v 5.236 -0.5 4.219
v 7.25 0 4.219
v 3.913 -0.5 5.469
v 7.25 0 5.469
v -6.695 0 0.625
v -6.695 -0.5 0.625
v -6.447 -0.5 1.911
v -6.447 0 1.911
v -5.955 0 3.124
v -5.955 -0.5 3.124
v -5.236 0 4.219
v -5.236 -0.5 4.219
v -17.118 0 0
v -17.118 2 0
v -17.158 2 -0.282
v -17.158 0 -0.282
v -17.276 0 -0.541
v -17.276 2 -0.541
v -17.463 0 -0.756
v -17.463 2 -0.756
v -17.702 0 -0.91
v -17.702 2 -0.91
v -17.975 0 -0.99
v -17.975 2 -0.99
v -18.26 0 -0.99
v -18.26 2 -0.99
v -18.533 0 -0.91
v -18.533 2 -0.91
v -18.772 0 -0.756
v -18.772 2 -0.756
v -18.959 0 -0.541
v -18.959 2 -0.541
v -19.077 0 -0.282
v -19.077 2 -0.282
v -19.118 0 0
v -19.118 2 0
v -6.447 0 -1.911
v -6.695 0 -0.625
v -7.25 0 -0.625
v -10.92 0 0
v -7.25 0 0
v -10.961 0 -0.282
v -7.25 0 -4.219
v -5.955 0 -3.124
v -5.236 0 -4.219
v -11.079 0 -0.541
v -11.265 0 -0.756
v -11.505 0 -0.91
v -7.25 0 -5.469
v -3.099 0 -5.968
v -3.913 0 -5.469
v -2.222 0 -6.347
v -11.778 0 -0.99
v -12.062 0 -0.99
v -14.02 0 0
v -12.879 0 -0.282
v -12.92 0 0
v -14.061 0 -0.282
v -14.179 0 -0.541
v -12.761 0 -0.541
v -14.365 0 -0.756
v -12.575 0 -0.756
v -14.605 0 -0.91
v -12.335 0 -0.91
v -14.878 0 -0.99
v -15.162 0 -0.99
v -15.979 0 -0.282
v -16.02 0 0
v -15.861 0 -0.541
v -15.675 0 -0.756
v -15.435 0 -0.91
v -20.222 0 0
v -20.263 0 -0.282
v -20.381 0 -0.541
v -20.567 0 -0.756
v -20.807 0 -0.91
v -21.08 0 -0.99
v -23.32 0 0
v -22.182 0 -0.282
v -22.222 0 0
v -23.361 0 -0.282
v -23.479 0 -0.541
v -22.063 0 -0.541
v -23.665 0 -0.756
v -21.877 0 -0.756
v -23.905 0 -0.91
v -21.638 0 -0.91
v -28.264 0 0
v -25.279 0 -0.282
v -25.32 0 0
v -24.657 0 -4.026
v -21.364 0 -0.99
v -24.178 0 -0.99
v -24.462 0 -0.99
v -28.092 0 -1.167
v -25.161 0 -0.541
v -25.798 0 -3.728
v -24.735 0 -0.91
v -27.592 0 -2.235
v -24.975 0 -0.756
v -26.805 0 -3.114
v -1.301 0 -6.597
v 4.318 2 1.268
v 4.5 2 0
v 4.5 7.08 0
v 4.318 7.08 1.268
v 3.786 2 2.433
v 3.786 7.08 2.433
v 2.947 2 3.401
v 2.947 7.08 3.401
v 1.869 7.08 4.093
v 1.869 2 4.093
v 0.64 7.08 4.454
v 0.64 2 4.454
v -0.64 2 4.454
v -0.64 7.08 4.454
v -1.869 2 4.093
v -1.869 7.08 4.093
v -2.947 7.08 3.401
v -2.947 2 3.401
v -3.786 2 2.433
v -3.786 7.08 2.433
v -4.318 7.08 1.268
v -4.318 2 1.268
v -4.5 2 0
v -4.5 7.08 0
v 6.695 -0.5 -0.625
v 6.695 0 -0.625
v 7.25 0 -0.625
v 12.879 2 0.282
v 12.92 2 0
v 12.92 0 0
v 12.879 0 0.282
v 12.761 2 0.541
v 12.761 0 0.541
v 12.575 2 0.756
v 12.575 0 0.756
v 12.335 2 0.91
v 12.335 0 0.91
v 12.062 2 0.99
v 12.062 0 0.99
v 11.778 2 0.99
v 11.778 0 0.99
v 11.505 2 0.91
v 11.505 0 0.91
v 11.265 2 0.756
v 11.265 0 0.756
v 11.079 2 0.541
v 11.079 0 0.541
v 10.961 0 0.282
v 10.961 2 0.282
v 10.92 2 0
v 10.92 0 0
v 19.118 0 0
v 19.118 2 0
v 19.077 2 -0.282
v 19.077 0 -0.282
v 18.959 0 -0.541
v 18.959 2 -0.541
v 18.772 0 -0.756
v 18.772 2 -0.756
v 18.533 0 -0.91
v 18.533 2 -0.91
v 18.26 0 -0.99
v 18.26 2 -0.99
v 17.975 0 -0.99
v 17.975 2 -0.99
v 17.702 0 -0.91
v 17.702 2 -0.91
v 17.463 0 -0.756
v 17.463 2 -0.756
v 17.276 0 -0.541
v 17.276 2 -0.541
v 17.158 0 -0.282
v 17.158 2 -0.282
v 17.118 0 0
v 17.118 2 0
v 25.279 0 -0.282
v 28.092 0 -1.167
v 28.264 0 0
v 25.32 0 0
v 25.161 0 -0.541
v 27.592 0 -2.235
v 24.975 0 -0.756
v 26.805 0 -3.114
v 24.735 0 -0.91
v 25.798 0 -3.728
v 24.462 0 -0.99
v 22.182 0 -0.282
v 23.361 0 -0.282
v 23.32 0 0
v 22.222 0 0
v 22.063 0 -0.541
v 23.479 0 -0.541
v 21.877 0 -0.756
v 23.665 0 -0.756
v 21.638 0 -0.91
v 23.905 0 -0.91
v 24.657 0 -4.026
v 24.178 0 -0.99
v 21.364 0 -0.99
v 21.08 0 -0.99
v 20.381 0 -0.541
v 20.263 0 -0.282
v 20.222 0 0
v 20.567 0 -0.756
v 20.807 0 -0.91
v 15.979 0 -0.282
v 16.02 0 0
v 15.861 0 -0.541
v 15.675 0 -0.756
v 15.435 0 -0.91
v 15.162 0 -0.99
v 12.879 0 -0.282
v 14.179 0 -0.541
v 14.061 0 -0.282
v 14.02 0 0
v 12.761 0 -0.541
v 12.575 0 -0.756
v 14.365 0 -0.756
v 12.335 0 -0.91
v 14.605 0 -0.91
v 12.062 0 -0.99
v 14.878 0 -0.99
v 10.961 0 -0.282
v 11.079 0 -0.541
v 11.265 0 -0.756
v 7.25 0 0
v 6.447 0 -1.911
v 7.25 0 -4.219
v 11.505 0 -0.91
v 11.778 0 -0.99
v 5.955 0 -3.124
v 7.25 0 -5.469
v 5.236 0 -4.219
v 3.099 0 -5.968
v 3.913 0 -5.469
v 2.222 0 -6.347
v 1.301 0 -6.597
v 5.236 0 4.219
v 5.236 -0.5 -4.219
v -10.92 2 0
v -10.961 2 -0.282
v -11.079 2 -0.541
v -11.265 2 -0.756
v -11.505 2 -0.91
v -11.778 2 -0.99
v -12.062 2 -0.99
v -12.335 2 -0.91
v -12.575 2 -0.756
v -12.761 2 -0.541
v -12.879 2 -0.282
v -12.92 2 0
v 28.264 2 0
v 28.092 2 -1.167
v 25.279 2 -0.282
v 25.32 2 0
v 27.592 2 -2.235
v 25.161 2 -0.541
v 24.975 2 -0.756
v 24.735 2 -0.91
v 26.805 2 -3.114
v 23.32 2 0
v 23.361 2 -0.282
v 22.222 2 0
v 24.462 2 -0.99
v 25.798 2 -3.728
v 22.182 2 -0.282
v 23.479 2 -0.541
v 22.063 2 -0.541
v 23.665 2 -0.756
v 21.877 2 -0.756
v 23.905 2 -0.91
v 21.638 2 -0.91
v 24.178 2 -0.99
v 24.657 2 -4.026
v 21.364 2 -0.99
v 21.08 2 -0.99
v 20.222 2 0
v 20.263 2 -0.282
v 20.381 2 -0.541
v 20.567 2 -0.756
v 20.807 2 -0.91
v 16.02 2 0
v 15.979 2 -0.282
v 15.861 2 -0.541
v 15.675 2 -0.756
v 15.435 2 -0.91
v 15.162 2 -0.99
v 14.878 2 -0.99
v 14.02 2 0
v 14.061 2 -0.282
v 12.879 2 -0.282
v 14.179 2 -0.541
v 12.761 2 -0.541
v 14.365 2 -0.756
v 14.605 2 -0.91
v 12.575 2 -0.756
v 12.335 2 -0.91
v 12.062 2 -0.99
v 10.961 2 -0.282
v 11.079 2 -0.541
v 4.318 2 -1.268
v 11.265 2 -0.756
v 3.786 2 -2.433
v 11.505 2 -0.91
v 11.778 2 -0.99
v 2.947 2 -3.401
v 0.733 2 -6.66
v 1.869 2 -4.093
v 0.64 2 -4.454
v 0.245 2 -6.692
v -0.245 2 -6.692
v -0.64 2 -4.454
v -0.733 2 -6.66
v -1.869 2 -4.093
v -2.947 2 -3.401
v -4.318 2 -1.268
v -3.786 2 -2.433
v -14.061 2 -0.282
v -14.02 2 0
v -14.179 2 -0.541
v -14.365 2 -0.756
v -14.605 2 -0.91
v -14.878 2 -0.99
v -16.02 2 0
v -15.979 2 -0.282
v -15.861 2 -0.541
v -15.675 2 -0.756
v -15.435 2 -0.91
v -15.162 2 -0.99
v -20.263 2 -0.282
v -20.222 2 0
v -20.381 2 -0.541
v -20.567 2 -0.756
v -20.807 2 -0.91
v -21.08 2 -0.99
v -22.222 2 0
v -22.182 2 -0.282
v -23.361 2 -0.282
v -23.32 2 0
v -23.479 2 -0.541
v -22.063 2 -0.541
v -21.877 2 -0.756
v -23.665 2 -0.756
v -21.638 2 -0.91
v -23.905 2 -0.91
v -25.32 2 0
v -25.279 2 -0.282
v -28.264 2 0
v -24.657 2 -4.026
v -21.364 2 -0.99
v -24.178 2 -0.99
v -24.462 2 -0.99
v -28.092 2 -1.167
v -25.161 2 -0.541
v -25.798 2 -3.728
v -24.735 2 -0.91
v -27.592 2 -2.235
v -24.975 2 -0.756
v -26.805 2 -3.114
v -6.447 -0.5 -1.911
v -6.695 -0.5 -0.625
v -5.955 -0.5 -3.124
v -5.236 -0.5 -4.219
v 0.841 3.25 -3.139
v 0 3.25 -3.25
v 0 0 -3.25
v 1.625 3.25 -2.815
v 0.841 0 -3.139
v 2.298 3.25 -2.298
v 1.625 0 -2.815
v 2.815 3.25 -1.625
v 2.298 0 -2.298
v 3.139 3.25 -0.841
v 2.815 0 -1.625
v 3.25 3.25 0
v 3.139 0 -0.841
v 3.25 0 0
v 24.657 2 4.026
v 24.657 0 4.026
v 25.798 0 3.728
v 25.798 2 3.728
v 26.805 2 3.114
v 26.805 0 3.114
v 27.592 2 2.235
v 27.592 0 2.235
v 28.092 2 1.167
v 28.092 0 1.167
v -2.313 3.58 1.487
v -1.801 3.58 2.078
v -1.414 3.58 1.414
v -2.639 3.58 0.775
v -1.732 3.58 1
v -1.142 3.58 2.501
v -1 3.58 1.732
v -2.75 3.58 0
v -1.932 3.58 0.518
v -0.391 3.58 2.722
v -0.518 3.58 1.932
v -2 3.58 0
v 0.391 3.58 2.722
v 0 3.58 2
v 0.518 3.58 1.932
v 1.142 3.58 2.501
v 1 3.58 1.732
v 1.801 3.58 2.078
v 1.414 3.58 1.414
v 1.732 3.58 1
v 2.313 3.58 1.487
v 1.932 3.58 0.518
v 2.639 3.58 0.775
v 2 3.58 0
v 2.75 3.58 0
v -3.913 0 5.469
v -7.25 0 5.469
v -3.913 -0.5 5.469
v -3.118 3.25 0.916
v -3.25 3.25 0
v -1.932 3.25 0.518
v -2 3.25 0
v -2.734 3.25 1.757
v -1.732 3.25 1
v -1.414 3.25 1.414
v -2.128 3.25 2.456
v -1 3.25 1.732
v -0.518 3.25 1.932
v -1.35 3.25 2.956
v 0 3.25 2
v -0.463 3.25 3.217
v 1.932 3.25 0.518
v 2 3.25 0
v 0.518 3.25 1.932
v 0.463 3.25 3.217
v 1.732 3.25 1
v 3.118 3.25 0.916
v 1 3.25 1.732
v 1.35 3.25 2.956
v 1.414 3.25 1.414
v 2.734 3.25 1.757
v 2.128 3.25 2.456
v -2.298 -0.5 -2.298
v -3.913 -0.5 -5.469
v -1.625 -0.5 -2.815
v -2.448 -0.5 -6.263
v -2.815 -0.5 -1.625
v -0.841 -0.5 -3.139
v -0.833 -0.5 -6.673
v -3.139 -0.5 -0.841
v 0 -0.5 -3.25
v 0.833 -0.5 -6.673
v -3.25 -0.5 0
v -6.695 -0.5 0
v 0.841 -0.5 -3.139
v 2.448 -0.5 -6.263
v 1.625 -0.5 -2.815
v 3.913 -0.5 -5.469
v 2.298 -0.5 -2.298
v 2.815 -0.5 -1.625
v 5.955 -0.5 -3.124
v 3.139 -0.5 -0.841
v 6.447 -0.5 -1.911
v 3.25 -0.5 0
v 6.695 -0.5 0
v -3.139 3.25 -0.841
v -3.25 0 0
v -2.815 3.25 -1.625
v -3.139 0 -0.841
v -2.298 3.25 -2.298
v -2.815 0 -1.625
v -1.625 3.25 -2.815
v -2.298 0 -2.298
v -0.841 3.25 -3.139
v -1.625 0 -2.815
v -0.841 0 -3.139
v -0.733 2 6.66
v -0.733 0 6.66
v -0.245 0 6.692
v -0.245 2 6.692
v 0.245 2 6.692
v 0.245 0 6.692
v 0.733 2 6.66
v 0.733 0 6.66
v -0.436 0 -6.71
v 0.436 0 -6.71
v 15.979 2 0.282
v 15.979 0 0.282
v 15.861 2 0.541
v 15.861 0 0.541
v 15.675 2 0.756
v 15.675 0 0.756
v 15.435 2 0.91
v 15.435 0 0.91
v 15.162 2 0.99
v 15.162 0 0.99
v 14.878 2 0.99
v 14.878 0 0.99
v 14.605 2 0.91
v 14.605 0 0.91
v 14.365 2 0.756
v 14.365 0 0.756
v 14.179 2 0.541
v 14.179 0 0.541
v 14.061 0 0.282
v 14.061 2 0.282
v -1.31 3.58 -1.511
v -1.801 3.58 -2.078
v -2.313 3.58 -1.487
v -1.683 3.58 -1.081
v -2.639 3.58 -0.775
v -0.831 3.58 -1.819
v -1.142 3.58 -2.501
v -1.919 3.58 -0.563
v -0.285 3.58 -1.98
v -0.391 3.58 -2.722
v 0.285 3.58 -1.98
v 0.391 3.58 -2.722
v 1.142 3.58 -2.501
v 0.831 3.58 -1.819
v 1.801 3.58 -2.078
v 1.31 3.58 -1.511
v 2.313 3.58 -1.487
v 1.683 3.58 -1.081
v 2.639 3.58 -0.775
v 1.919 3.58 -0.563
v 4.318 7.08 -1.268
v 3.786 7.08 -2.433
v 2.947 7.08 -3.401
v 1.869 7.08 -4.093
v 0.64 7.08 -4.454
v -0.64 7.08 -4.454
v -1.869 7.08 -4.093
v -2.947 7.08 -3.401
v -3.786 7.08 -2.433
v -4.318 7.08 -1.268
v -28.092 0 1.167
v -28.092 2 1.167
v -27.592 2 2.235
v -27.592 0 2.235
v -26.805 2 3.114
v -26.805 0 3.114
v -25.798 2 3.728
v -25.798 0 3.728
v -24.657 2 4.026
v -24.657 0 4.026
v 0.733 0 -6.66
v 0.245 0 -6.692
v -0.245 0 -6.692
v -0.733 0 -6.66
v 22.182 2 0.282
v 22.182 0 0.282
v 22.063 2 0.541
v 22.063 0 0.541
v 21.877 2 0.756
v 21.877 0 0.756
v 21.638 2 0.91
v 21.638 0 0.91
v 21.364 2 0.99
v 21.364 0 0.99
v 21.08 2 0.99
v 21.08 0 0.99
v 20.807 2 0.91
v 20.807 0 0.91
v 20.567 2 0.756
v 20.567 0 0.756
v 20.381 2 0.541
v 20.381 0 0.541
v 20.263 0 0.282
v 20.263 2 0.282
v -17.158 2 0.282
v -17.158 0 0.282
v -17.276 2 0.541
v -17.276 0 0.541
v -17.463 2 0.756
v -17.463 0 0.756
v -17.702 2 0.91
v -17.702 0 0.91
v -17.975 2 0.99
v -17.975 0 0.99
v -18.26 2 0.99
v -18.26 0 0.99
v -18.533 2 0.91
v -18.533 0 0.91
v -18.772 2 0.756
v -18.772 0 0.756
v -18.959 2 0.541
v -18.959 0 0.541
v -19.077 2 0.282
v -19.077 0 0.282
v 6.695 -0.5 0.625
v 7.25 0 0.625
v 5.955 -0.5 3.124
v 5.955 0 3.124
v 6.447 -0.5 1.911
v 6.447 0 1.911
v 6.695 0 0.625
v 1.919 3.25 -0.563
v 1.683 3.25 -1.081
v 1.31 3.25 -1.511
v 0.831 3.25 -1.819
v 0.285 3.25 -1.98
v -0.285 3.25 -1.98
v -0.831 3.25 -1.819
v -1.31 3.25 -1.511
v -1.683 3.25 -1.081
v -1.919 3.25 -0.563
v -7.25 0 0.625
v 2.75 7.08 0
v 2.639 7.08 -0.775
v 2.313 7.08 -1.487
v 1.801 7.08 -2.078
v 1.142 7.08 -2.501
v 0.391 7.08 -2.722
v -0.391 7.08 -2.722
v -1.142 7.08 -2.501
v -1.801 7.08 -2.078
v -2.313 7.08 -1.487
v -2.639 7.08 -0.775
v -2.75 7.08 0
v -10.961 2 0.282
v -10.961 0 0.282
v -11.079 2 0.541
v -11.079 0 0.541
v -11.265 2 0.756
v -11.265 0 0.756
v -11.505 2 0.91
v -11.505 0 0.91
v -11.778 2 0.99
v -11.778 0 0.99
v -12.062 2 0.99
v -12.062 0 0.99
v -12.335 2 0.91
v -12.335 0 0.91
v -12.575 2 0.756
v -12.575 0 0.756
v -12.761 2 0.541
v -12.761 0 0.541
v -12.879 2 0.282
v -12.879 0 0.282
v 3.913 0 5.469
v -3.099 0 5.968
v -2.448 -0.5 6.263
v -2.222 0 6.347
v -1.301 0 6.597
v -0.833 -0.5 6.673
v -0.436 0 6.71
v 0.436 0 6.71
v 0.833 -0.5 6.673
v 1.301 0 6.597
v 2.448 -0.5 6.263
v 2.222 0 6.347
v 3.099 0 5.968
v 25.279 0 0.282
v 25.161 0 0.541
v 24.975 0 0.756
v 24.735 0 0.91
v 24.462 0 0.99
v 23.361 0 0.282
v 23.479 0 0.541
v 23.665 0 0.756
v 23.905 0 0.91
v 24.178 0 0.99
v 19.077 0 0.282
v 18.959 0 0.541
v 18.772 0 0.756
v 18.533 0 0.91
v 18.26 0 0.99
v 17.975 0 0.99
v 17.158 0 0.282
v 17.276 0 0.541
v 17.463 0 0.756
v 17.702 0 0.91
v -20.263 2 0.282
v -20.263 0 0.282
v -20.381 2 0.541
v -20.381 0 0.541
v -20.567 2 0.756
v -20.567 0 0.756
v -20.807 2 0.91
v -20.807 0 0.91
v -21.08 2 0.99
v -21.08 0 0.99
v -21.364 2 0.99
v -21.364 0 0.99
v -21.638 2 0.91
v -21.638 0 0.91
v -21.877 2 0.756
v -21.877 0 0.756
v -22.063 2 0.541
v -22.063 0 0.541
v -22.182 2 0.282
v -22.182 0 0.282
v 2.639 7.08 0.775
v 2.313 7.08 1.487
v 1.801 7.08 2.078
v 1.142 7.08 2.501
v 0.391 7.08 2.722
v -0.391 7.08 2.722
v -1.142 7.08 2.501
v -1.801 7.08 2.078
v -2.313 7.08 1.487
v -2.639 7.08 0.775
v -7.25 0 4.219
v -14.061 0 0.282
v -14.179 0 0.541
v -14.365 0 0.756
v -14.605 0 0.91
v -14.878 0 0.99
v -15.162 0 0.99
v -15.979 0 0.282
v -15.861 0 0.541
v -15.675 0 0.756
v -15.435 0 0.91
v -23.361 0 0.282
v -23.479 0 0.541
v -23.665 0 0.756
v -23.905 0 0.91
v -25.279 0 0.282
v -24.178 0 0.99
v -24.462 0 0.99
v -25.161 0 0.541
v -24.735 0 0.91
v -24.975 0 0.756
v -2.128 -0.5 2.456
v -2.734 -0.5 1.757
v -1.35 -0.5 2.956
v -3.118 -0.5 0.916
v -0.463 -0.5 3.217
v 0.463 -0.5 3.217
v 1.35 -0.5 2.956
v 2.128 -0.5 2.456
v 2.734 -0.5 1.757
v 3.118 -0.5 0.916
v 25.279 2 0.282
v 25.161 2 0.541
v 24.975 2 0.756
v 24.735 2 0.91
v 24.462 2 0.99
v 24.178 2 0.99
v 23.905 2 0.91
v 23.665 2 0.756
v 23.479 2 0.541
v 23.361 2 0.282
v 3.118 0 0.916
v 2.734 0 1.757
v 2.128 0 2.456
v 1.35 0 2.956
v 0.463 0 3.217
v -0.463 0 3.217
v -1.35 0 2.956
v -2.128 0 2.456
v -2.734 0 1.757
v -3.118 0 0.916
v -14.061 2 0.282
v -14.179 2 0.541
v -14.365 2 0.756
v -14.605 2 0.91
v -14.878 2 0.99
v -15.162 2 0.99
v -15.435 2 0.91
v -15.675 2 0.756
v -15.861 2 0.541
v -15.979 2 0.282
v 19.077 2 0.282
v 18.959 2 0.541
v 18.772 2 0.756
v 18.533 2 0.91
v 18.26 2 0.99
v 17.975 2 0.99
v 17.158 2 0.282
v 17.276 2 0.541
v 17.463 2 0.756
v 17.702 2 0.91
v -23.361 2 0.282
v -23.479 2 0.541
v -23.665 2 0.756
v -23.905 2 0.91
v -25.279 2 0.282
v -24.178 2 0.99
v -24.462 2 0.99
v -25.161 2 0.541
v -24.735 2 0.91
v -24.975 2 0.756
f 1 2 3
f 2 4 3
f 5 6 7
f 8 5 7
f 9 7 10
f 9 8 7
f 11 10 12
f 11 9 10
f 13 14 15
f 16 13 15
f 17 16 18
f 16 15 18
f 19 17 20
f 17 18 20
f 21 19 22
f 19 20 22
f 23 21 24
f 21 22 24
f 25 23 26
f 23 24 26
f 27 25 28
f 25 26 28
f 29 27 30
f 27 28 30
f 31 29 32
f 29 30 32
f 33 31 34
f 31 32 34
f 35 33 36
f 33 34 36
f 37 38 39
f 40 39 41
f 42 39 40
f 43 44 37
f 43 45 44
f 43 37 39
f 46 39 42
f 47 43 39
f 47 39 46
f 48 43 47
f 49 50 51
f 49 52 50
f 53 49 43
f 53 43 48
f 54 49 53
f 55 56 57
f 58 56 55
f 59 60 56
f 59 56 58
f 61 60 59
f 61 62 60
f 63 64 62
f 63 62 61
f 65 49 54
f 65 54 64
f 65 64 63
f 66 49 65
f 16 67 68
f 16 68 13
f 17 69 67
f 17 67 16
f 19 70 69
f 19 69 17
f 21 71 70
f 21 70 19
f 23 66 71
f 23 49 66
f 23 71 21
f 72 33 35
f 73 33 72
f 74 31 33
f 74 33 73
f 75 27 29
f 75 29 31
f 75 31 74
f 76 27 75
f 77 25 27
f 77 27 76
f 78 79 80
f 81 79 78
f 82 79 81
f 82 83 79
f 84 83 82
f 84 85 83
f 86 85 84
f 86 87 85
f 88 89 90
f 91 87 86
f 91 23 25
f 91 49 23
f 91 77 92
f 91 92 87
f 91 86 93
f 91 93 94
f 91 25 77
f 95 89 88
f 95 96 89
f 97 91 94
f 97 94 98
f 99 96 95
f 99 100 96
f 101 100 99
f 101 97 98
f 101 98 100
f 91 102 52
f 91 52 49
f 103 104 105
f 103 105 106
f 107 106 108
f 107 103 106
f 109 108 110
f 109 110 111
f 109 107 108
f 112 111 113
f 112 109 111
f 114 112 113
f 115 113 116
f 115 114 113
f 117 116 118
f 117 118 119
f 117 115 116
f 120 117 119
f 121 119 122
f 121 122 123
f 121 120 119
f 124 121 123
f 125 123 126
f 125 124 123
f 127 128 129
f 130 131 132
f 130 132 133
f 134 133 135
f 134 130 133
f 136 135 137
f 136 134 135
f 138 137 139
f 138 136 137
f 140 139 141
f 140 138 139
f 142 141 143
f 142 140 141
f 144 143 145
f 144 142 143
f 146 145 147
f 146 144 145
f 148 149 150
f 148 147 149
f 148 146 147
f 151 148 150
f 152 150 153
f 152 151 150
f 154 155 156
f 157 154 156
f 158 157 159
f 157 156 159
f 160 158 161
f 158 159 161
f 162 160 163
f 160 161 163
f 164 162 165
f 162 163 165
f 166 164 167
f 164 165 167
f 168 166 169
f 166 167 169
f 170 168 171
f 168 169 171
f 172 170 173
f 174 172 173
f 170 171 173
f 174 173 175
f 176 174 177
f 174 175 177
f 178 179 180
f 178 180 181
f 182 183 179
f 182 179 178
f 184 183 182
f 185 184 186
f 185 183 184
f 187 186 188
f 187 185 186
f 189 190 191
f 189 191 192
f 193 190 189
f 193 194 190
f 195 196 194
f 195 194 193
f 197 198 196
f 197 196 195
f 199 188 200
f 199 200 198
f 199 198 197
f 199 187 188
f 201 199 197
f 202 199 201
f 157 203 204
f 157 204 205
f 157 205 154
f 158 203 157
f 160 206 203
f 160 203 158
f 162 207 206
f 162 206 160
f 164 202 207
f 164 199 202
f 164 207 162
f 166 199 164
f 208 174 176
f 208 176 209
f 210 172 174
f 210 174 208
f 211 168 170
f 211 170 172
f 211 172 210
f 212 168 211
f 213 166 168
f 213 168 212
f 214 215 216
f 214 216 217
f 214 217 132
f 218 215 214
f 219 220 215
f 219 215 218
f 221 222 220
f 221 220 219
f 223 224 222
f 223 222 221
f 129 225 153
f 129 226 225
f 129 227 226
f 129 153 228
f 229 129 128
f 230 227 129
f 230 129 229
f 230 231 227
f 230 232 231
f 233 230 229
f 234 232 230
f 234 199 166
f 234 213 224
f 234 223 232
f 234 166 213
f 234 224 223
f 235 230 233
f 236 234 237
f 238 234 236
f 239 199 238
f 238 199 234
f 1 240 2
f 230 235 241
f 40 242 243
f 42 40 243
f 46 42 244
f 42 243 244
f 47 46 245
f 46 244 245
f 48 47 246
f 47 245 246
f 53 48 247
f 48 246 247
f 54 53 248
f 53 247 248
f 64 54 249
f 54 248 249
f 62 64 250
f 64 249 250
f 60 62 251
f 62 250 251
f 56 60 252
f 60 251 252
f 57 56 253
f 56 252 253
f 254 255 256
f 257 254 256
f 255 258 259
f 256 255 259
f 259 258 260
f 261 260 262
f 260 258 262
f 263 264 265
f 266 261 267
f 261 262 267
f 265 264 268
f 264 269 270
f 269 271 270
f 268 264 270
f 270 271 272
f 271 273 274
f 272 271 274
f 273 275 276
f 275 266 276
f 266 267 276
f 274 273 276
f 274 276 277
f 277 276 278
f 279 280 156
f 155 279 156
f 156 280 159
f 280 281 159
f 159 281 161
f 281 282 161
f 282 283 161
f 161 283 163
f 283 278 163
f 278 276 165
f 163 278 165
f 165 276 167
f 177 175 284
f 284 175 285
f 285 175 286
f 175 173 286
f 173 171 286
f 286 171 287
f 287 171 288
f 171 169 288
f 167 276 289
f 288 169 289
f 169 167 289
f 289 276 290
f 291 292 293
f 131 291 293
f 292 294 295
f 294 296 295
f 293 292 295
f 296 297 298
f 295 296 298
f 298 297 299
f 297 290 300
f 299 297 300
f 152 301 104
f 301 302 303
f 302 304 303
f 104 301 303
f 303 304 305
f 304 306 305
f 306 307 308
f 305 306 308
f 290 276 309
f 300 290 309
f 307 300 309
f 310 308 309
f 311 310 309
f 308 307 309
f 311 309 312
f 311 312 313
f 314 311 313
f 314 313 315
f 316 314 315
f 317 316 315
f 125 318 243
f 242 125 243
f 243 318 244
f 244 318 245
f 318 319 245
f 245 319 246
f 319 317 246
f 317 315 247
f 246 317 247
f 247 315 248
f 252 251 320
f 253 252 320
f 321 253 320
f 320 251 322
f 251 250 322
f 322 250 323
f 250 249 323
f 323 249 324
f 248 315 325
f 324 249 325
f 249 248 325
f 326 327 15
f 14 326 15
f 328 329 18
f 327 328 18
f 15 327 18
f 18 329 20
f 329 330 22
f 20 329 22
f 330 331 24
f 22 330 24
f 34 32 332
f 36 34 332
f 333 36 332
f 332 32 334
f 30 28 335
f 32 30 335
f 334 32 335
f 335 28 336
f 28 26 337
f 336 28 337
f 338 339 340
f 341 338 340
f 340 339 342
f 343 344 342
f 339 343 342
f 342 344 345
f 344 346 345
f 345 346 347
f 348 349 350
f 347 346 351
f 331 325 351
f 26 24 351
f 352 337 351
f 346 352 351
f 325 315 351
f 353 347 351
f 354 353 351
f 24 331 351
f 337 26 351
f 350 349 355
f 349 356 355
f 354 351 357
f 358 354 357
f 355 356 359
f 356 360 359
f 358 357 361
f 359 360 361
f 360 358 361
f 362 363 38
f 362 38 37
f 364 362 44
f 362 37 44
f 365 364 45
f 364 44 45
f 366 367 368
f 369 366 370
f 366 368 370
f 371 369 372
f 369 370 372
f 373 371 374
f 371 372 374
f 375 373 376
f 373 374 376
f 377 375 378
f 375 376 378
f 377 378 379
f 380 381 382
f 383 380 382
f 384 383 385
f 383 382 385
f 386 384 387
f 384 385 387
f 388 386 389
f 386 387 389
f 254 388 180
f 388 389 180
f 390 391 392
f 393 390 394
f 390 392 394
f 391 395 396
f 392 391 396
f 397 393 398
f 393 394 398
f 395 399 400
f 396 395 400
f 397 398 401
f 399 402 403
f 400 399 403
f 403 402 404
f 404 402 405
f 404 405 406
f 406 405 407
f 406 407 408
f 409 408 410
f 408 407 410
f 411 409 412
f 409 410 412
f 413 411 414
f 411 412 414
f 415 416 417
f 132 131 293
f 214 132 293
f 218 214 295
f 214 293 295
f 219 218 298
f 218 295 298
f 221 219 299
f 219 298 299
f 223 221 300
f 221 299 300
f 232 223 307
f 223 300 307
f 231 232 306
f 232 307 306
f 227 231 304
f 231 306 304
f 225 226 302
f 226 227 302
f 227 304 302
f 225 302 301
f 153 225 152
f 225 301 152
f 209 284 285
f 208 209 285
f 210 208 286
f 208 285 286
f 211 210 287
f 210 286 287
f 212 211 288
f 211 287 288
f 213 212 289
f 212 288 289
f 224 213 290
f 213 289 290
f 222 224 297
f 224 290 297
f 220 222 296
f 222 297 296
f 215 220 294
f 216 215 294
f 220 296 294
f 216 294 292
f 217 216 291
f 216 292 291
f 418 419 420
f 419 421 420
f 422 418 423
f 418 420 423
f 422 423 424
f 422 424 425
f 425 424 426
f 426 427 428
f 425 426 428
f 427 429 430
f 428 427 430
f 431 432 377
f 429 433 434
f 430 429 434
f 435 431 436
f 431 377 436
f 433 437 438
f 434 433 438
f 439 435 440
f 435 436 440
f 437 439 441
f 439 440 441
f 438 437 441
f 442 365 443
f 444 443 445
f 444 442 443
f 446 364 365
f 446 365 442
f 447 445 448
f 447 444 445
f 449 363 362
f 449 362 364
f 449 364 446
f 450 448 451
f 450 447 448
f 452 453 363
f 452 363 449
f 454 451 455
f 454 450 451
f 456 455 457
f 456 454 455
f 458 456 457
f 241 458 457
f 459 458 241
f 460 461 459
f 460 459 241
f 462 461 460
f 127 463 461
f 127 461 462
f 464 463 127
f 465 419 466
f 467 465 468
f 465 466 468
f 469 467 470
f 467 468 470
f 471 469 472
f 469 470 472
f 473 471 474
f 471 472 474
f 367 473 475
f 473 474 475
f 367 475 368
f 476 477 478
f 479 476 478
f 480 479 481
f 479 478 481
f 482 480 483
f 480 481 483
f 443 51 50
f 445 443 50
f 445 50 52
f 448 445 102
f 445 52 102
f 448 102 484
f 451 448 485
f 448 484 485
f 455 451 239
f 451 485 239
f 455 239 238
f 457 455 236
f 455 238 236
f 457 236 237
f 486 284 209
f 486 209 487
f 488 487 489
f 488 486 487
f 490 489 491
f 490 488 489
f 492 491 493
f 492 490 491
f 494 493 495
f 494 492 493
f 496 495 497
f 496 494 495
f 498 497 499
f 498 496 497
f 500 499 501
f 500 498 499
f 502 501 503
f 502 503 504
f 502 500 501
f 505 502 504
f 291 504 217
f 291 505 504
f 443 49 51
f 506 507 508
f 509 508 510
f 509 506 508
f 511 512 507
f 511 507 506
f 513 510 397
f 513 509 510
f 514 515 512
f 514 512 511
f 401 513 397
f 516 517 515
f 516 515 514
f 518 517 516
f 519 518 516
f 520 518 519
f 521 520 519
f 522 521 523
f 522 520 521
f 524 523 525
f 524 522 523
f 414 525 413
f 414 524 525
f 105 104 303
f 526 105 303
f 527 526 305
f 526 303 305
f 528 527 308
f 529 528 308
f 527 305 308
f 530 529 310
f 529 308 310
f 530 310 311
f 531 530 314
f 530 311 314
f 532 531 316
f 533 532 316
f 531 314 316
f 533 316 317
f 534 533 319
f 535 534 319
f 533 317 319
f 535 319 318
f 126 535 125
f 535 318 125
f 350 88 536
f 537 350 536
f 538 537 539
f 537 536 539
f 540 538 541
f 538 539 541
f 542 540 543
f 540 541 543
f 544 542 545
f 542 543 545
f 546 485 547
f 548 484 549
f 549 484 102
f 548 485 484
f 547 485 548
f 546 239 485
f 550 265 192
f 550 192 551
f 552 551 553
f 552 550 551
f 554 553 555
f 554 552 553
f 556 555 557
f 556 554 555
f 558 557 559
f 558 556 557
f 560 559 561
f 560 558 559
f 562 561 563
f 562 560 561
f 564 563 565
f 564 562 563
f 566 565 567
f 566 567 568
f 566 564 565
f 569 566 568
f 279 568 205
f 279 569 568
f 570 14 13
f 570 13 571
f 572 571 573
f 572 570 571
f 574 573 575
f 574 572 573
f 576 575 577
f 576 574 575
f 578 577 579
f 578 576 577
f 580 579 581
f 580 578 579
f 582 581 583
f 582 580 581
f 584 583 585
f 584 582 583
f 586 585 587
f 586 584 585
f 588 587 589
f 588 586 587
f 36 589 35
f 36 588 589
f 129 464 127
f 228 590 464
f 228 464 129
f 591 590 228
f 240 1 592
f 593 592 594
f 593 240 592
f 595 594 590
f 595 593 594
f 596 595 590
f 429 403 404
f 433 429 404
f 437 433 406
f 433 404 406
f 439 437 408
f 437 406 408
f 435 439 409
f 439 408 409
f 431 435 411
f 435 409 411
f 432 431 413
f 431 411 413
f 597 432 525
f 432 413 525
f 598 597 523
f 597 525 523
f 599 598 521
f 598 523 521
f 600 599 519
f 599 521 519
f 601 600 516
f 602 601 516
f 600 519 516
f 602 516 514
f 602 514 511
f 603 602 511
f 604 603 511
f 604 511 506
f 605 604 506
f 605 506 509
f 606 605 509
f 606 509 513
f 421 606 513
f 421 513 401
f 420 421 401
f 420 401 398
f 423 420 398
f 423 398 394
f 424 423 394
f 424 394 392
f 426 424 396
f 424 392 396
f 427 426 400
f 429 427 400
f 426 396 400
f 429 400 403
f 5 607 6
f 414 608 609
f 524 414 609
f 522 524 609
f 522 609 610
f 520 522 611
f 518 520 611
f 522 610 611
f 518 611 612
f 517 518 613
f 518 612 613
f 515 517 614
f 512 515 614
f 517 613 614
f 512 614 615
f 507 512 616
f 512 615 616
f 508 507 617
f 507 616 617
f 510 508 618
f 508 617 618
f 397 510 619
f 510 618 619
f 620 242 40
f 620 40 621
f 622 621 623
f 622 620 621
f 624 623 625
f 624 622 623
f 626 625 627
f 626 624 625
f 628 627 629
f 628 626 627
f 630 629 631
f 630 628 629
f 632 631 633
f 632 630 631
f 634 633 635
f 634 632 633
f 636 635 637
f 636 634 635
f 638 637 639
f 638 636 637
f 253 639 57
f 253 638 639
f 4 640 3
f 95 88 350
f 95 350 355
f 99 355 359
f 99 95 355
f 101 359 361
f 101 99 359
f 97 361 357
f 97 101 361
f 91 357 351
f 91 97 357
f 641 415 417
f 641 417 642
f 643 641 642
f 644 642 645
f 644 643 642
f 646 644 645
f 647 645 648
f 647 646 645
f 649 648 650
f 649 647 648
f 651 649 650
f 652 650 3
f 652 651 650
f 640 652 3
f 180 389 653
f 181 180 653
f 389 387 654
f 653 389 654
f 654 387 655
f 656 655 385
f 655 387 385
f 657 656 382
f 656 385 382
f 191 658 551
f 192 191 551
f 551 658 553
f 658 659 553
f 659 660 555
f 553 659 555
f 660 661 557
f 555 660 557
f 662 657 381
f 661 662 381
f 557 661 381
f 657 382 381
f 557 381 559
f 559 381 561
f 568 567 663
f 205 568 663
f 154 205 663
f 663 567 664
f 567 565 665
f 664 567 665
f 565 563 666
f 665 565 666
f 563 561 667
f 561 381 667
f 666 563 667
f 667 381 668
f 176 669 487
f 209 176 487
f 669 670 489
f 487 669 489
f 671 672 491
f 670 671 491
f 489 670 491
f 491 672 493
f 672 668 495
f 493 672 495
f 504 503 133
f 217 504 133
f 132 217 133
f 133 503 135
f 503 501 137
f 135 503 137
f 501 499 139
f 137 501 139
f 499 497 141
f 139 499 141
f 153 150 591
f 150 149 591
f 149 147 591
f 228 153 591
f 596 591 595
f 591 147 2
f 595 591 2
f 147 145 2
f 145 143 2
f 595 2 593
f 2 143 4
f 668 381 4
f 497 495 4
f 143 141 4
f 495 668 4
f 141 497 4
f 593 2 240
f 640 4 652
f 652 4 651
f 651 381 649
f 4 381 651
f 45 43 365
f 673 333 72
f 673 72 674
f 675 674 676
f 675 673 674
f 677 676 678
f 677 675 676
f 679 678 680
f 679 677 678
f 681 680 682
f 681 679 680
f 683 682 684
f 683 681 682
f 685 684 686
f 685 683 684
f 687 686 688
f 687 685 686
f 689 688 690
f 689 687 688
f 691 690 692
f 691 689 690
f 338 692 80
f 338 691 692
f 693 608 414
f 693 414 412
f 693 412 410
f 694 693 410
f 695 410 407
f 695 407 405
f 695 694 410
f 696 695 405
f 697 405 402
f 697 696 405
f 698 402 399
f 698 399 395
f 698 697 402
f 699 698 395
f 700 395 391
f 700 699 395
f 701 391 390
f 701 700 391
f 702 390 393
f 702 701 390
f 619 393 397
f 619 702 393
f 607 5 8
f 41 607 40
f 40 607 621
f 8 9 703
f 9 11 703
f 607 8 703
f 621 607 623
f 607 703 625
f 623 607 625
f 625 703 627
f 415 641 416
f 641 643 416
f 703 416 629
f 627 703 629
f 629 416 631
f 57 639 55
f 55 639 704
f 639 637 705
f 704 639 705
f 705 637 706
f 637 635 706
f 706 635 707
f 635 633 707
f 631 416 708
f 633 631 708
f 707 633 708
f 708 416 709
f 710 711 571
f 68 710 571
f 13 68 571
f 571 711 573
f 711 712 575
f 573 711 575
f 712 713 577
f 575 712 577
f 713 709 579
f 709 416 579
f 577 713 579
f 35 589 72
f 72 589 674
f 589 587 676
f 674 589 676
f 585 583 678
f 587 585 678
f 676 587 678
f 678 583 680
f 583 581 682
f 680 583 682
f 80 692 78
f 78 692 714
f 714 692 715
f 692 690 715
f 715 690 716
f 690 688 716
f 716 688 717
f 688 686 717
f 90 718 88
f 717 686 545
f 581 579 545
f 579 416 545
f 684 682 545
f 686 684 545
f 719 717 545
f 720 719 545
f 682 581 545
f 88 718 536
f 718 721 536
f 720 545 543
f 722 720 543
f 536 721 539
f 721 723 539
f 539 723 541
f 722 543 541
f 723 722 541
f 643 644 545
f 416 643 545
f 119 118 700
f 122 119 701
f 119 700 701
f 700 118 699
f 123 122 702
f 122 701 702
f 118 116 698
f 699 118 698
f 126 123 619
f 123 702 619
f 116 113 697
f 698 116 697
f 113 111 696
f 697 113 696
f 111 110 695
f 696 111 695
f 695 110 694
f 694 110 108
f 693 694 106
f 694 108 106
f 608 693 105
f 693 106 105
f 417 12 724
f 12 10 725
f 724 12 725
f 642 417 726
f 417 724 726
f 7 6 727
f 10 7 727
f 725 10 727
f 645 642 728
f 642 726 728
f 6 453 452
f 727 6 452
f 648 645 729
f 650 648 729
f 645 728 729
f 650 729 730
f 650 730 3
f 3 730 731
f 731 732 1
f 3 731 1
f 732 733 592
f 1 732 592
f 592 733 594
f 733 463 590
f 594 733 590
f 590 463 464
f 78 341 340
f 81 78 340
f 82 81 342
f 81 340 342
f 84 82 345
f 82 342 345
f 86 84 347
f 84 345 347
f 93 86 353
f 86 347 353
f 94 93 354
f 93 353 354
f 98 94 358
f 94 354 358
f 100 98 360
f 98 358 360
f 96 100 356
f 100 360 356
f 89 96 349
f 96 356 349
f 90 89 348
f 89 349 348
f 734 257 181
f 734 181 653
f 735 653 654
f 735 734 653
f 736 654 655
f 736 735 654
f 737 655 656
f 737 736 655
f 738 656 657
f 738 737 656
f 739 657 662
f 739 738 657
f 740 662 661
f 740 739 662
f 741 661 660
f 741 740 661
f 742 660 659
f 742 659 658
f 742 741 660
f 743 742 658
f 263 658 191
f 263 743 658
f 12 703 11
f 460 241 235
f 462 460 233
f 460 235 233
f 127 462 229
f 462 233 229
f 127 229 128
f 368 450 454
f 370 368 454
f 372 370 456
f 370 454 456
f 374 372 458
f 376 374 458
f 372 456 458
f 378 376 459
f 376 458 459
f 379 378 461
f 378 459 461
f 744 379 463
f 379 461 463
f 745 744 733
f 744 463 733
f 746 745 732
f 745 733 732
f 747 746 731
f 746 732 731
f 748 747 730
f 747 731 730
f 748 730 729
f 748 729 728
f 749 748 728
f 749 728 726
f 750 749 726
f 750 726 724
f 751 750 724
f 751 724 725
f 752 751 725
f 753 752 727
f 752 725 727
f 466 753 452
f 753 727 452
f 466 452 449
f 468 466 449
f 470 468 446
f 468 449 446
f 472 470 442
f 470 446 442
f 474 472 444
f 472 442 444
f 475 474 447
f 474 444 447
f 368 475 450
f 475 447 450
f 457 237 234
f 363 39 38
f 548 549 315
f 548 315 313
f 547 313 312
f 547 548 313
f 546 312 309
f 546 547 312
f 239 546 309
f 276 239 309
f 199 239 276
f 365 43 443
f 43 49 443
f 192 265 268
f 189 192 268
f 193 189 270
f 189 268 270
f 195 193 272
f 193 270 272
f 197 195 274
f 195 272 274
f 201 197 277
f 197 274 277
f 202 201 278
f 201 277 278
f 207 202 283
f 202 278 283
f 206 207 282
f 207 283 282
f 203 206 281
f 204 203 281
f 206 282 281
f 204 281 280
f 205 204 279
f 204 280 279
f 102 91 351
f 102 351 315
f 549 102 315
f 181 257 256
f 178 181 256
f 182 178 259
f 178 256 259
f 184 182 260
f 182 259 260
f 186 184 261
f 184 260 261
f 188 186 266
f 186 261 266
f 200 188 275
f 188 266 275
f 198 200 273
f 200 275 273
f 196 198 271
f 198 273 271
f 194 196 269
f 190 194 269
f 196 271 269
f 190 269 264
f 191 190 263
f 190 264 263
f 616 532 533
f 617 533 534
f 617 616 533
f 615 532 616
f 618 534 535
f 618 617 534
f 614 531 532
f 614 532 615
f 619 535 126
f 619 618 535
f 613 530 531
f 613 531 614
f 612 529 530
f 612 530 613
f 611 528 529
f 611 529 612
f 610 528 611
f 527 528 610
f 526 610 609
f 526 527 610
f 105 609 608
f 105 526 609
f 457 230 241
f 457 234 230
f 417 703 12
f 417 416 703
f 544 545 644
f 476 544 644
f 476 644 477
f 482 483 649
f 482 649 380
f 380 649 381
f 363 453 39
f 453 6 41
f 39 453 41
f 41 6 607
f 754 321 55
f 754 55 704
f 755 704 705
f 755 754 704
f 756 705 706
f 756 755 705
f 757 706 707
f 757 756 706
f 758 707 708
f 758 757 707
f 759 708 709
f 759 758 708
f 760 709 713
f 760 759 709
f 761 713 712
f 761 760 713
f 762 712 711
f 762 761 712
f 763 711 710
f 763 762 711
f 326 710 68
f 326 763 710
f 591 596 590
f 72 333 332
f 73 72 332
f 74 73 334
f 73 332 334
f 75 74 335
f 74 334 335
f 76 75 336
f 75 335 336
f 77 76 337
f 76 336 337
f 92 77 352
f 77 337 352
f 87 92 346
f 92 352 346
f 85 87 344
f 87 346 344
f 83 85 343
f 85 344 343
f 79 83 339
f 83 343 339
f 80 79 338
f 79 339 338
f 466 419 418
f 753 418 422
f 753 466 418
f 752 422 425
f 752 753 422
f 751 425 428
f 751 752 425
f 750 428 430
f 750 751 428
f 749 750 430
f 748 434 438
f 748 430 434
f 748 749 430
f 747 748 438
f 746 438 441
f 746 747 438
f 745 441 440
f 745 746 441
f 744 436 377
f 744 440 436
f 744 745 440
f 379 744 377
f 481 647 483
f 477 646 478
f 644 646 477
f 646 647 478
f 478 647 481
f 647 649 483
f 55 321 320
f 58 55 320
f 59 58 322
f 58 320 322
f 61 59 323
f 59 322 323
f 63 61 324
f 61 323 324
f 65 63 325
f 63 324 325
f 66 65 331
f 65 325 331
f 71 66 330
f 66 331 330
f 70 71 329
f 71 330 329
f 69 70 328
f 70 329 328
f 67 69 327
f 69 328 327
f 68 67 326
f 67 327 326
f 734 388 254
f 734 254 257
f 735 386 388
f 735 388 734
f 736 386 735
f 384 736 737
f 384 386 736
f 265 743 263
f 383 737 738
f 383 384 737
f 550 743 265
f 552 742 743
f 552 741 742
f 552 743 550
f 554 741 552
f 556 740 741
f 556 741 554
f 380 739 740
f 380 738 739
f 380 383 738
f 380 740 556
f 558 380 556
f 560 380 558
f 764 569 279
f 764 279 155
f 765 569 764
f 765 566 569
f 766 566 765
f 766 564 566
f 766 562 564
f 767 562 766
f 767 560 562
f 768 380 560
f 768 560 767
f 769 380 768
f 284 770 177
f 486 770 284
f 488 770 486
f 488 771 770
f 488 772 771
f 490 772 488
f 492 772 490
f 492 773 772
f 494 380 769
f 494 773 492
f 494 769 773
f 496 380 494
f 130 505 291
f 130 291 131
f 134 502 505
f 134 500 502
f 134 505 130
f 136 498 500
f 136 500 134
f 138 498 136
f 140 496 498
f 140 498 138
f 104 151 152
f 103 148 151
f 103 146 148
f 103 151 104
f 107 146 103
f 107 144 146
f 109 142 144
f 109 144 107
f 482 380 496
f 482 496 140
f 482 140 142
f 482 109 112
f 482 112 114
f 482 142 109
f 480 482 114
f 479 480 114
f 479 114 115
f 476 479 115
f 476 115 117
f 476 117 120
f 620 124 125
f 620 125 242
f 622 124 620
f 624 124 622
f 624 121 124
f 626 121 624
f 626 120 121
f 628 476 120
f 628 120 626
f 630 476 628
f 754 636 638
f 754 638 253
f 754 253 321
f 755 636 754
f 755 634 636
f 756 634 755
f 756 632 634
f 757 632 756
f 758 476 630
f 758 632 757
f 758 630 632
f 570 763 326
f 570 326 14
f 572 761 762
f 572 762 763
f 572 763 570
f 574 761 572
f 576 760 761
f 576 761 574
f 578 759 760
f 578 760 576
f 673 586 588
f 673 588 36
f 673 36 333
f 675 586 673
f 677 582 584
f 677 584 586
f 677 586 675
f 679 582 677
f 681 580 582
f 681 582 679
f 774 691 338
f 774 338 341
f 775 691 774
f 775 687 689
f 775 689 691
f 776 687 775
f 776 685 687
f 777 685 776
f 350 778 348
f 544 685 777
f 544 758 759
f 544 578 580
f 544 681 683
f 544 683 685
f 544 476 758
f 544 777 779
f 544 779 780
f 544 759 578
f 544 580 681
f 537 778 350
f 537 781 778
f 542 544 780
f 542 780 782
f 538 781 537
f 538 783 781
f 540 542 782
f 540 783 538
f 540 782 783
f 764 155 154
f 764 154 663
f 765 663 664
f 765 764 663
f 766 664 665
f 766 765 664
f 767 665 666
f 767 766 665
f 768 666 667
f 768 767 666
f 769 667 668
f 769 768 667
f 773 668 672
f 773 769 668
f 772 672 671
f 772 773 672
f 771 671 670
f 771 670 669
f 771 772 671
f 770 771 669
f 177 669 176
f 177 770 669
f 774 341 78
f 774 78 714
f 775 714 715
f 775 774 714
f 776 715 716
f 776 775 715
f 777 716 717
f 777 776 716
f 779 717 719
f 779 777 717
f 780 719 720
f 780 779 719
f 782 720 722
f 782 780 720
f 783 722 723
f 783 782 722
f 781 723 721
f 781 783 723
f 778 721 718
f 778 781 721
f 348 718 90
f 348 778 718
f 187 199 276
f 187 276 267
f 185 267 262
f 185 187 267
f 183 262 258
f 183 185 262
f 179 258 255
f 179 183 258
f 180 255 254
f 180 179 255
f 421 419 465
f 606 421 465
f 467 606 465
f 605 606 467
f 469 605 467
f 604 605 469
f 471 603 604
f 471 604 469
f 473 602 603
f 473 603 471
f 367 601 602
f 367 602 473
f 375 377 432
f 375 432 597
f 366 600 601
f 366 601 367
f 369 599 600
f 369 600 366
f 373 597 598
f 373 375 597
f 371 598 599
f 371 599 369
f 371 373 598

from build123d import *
from build123d.topology import SkipClean

# Parameters (mm, degrees)
BOSS_EXTRUDE1_DEPTH = 2
SKETCH2_R           = 1.000000794
CUT_EXTRUDE1_DEPTH  = 2
SKETCH3_R           = 4.5
BOSS_EXTRUDE2_DEPTH = 5.08
SKETCH4_R           = 2.75
CUT_EXTRUDE2_DEPTH  = 3.5
SKETCH5_R           = 3.25
CUT_EXTRUDE3_DEPTH  = 3.25
SKETCH7_R           = 6.724332425
BOSS_EXTRUDE3_DEPTH = 0.5
SKETCH8_W           = 14.5
SKETCH8_H           = 1.25
SKETCH8_H_2         = 1.25000004
BOSS_EXTRUDE4_DEPTH = 0.5
SKETCH6_R           = 2
CUT_EXTRUDE4_DEPTH  = 30.338041851
SKETCH15_R          = 3.25
CUT_EXTRUDE5_DEPTH  = 3.75


# Read off the part's stored shape, not the designer's step: Mirror3
with BuildPart() as part:
    # Sketch1 → Boss-Extrude1 (new body)
    with BuildSketch(Plane(origin=(0, 0, 0), x_dir=(1, 0, 0), z_dir=(0, 1, 0))):
        with BuildLine():
            Line((-24.656541995, 4.026414392), (-0.733072501, 6.659779954))
            ThreePointArc((-0.733072501, 6.659779954), (0, 6.695526614), (0.733072501, 6.659779954))
            Line((0.733072501, 6.659779954), (24.656541995, 4.026414392))
            ThreePointArc((24.656541995, 4.026414392), (28.264069964, 0), (24.656541995, -4.026414392))
            Line((24.656541995, -4.026414392), (0.733072501, -6.659779954))
            ThreePointArc((0.733072501, -6.659779954), (0, -6.695526614), (-0.733072501, -6.659779954))
            Line((-0.733072501, -6.659779954), (-24.656541995, -4.026414392))
            ThreePointArc((-24.656541995, -4.026414392), (-28.264069964, 0), (-24.656541995, 4.026414392))
        make_face()
    extrude(amount=BOSS_EXTRUDE1_DEPTH)

    # Sketch2 → Cut-Extrude1 (cut)
    with BuildSketch(Plane(origin=(0, 2, 0), x_dir=(1, 0, 0), z_dir=(0, 1, 0))):
        with Locations(Location((-24.320001144, 0, 0), (0, 0, 270))):
            Circle(SKETCH2_R)
        with Locations(Location((-21.222128244, 0, 0), (0, 0, 270))):
            Circle(SKETCH2_R)
        with Locations(Location((-18.117543648, 0, 0), (0, 0, 270))):
            Circle(SKETCH2_R)
        with Locations(Location((-15.019999932, 0, 0), (0, 0, 270))):
            Circle(SKETCH2_R)
        with Locations(Location((-11.919999782, 0, 0), (0, 0, 270))):
            Circle(SKETCH2_R)
        with Locations(Location((24.320001144, 0, 0), (0, 0, 90))):
            Circle(SKETCH2_R)
        with Locations(Location((21.222128244, 0, 0), (0, 0, 90))):
            Circle(SKETCH2_R)
        with Locations(Location((18.117543648, 0, 0), (0, 0, 90))):
            Circle(SKETCH2_R)
        with Locations(Location((15.019999932, 0, 0), (0, 0, 90))):
            Circle(SKETCH2_R)
        with Locations(Location((11.919999782, 0, 0), (0, 0, 90))):
            Circle(SKETCH2_R)
    extrude(amount=-CUT_EXTRUDE1_DEPTH, mode=Mode.SUBTRACT)

    # Sketch3 → Boss-Extrude2 (add)
    with BuildSketch(Plane(origin=(0, 2, 0), x_dir=(1, 0, 0), z_dir=(0, 1, 0))):
        with Locations(Location((0, 0, 0), (0, 0, 270))):
            Circle(SKETCH3_R)
    extrude(amount=BOSS_EXTRUDE2_DEPTH)

    # Sketch4 → Cut-Extrude2 (cut)
    with BuildSketch(Plane(origin=(0, 7.08, 0), x_dir=(1, 0, 0), z_dir=(0, 1, 0))):
        with Locations(Location((0, 0, 0), (0, 0, 270))):
            Circle(SKETCH4_R)
    extrude(amount=-CUT_EXTRUDE2_DEPTH, mode=Mode.SUBTRACT)

    # Sketch5 → Cut-Extrude3 (cut)
    with BuildSketch(Plane.XZ):
        with Locations(Location((0, 0, 0), (0, 0, 270))):
            Circle(SKETCH5_R)
    extrude(amount=-CUT_EXTRUDE3_DEPTH, mode=Mode.SUBTRACT)

    # Sketch7 → Boss-Extrude3 (add)
    with BuildSketch(Plane.XZ):
        with Locations(Location((0, 0, 0), (0, 0, 78.843263662))):
            Circle(SKETCH7_R)
    extrude(amount=BOSS_EXTRUDE3_DEPTH)

    # Sketch8 → Boss-Extrude4 (add)
    with BuildSketch(Plane.XZ):
        Rectangle(SKETCH8_W, SKETCH8_H)
        with Locations((0, -4.843845819)):
            Rectangle(SKETCH8_W, SKETCH8_H_2)
        with Locations((0, 4.843845819)):
            Rectangle(SKETCH8_W, SKETCH8_H_2)
    extrude(amount=BOSS_EXTRUDE4_DEPTH)

    # Sketch13 → Cut-Loft1 section 0
    with BuildSketch(Plane.XY.offset(-4.218845799)):
        with BuildLine():
            Line((-7.25, 0), (-5.236218739, -0.5))
            Line((-5.236218739, -0.5), (-7.25, -0.5))
            Line((-7.25, -0.5), (-7.25, 0))
        make_face()
    # Sketch12 → Cut-Loft1 section 1
    with BuildSketch(Plane(origin=(0, 0, -5.468845839), x_dir=(-1, 0, 0), z_dir=(0, 0, -1))):
        with BuildLine():
            Line((3.912591436, -0.5), (7.25, -0.5))
            Line((7.25, -0.5), (7.25, 0))
            Line((7.25, 0), (3.912591436, -0.5))
        make_face()
    cut_loft1 = loft(mode=Mode.SUBTRACT)

    # Mirror1: Cut-Loft1 across plane
    add(cut_loft1.mirror(Plane.XY), mode=Mode.SUBTRACT)

    # Mirror2: Cut-Loft1 across plane
    add(cut_loft1.mirror(Plane(origin=(0, 0, 0), x_dir=(0, 0, 1), z_dir=(1, 0, 0))), mode=Mode.SUBTRACT)

    # Mirror3
    split(bisect_by=Plane.XY, keep=Keep.BOTTOM)

    # Mirror3 2: part across plane


with BuildPart() as part_1:
    with SkipClean():  # the faces are left unmerged after this step: merging them gives an invalid solid
        add(part.part)
        add(part.part.mirror(Plane.XY))

    # Sketch10 → Cut-Loft2 section 0
    with SkipClean():  # the faces are left unmerged after this step: merging them gives an invalid solid
        with BuildSketch(Plane(origin=(0, 0, -0.625), x_dir=(-1, 0, 0), z_dir=(0, 0, -1))):
            with BuildLine():
                Line((7.25, -0.5), (6.695223787, -0.5))
                Line((6.695223787, -0.5), (7.25, 0))
                Line((7.25, 0), (7.25, -0.5))
            make_face()
        # Sketch14 → Cut-Loft2 section 1
        with BuildSketch(Plane.XY.offset(0.625)):
            with BuildLine():
                Line((-7.25, 0), (-6.695223787, -0.5))
                Line((-6.695223787, -0.5), (-7.25, -0.5))
                Line((-7.25, -0.5), (-7.25, 0))
            make_face()
        cut_loft2 = loft(mode=Mode.SUBTRACT)

    # Mirror5: Cut-Loft2 across plane
    with SkipClean():  # the faces are left unmerged after this step: merging them gives an invalid solid
        add(cut_loft2.mirror(Plane(origin=(0, 0, 0), x_dir=(0, 0, 1), z_dir=(1, 0, 0))), mode=Mode.SUBTRACT)

    # Sketch6 → Cut-Extrude4 (cut, through all)
    with SkipClean():  # the faces are left unmerged after this step: merging them gives an invalid solid
        with BuildSketch(Plane(origin=(0, 3.58, 0), x_dir=(1, 0, 0), z_dir=(0, 1, 0))):
            with Locations(Location((0, 0, 0), (0, 0, 270))):
                Circle(SKETCH6_R)
        extrude(amount=-CUT_EXTRUDE4_DEPTH, mode=Mode.SUBTRACT)

    # Sketch15 → Cut-Extrude5 (cut)
    with SkipClean():  # the faces are left unmerged after this step: merging them gives an invalid solid
        with BuildSketch(Plane.XZ.offset(0.5)):
            with Locations(Location((0, 0, 0), (0, 0, 270))):
                Circle(SKETCH15_R)
        extrude(amount=-CUT_EXTRUDE5_DEPTH, mode=Mode.SUBTRACT)


solid = part_1.part
